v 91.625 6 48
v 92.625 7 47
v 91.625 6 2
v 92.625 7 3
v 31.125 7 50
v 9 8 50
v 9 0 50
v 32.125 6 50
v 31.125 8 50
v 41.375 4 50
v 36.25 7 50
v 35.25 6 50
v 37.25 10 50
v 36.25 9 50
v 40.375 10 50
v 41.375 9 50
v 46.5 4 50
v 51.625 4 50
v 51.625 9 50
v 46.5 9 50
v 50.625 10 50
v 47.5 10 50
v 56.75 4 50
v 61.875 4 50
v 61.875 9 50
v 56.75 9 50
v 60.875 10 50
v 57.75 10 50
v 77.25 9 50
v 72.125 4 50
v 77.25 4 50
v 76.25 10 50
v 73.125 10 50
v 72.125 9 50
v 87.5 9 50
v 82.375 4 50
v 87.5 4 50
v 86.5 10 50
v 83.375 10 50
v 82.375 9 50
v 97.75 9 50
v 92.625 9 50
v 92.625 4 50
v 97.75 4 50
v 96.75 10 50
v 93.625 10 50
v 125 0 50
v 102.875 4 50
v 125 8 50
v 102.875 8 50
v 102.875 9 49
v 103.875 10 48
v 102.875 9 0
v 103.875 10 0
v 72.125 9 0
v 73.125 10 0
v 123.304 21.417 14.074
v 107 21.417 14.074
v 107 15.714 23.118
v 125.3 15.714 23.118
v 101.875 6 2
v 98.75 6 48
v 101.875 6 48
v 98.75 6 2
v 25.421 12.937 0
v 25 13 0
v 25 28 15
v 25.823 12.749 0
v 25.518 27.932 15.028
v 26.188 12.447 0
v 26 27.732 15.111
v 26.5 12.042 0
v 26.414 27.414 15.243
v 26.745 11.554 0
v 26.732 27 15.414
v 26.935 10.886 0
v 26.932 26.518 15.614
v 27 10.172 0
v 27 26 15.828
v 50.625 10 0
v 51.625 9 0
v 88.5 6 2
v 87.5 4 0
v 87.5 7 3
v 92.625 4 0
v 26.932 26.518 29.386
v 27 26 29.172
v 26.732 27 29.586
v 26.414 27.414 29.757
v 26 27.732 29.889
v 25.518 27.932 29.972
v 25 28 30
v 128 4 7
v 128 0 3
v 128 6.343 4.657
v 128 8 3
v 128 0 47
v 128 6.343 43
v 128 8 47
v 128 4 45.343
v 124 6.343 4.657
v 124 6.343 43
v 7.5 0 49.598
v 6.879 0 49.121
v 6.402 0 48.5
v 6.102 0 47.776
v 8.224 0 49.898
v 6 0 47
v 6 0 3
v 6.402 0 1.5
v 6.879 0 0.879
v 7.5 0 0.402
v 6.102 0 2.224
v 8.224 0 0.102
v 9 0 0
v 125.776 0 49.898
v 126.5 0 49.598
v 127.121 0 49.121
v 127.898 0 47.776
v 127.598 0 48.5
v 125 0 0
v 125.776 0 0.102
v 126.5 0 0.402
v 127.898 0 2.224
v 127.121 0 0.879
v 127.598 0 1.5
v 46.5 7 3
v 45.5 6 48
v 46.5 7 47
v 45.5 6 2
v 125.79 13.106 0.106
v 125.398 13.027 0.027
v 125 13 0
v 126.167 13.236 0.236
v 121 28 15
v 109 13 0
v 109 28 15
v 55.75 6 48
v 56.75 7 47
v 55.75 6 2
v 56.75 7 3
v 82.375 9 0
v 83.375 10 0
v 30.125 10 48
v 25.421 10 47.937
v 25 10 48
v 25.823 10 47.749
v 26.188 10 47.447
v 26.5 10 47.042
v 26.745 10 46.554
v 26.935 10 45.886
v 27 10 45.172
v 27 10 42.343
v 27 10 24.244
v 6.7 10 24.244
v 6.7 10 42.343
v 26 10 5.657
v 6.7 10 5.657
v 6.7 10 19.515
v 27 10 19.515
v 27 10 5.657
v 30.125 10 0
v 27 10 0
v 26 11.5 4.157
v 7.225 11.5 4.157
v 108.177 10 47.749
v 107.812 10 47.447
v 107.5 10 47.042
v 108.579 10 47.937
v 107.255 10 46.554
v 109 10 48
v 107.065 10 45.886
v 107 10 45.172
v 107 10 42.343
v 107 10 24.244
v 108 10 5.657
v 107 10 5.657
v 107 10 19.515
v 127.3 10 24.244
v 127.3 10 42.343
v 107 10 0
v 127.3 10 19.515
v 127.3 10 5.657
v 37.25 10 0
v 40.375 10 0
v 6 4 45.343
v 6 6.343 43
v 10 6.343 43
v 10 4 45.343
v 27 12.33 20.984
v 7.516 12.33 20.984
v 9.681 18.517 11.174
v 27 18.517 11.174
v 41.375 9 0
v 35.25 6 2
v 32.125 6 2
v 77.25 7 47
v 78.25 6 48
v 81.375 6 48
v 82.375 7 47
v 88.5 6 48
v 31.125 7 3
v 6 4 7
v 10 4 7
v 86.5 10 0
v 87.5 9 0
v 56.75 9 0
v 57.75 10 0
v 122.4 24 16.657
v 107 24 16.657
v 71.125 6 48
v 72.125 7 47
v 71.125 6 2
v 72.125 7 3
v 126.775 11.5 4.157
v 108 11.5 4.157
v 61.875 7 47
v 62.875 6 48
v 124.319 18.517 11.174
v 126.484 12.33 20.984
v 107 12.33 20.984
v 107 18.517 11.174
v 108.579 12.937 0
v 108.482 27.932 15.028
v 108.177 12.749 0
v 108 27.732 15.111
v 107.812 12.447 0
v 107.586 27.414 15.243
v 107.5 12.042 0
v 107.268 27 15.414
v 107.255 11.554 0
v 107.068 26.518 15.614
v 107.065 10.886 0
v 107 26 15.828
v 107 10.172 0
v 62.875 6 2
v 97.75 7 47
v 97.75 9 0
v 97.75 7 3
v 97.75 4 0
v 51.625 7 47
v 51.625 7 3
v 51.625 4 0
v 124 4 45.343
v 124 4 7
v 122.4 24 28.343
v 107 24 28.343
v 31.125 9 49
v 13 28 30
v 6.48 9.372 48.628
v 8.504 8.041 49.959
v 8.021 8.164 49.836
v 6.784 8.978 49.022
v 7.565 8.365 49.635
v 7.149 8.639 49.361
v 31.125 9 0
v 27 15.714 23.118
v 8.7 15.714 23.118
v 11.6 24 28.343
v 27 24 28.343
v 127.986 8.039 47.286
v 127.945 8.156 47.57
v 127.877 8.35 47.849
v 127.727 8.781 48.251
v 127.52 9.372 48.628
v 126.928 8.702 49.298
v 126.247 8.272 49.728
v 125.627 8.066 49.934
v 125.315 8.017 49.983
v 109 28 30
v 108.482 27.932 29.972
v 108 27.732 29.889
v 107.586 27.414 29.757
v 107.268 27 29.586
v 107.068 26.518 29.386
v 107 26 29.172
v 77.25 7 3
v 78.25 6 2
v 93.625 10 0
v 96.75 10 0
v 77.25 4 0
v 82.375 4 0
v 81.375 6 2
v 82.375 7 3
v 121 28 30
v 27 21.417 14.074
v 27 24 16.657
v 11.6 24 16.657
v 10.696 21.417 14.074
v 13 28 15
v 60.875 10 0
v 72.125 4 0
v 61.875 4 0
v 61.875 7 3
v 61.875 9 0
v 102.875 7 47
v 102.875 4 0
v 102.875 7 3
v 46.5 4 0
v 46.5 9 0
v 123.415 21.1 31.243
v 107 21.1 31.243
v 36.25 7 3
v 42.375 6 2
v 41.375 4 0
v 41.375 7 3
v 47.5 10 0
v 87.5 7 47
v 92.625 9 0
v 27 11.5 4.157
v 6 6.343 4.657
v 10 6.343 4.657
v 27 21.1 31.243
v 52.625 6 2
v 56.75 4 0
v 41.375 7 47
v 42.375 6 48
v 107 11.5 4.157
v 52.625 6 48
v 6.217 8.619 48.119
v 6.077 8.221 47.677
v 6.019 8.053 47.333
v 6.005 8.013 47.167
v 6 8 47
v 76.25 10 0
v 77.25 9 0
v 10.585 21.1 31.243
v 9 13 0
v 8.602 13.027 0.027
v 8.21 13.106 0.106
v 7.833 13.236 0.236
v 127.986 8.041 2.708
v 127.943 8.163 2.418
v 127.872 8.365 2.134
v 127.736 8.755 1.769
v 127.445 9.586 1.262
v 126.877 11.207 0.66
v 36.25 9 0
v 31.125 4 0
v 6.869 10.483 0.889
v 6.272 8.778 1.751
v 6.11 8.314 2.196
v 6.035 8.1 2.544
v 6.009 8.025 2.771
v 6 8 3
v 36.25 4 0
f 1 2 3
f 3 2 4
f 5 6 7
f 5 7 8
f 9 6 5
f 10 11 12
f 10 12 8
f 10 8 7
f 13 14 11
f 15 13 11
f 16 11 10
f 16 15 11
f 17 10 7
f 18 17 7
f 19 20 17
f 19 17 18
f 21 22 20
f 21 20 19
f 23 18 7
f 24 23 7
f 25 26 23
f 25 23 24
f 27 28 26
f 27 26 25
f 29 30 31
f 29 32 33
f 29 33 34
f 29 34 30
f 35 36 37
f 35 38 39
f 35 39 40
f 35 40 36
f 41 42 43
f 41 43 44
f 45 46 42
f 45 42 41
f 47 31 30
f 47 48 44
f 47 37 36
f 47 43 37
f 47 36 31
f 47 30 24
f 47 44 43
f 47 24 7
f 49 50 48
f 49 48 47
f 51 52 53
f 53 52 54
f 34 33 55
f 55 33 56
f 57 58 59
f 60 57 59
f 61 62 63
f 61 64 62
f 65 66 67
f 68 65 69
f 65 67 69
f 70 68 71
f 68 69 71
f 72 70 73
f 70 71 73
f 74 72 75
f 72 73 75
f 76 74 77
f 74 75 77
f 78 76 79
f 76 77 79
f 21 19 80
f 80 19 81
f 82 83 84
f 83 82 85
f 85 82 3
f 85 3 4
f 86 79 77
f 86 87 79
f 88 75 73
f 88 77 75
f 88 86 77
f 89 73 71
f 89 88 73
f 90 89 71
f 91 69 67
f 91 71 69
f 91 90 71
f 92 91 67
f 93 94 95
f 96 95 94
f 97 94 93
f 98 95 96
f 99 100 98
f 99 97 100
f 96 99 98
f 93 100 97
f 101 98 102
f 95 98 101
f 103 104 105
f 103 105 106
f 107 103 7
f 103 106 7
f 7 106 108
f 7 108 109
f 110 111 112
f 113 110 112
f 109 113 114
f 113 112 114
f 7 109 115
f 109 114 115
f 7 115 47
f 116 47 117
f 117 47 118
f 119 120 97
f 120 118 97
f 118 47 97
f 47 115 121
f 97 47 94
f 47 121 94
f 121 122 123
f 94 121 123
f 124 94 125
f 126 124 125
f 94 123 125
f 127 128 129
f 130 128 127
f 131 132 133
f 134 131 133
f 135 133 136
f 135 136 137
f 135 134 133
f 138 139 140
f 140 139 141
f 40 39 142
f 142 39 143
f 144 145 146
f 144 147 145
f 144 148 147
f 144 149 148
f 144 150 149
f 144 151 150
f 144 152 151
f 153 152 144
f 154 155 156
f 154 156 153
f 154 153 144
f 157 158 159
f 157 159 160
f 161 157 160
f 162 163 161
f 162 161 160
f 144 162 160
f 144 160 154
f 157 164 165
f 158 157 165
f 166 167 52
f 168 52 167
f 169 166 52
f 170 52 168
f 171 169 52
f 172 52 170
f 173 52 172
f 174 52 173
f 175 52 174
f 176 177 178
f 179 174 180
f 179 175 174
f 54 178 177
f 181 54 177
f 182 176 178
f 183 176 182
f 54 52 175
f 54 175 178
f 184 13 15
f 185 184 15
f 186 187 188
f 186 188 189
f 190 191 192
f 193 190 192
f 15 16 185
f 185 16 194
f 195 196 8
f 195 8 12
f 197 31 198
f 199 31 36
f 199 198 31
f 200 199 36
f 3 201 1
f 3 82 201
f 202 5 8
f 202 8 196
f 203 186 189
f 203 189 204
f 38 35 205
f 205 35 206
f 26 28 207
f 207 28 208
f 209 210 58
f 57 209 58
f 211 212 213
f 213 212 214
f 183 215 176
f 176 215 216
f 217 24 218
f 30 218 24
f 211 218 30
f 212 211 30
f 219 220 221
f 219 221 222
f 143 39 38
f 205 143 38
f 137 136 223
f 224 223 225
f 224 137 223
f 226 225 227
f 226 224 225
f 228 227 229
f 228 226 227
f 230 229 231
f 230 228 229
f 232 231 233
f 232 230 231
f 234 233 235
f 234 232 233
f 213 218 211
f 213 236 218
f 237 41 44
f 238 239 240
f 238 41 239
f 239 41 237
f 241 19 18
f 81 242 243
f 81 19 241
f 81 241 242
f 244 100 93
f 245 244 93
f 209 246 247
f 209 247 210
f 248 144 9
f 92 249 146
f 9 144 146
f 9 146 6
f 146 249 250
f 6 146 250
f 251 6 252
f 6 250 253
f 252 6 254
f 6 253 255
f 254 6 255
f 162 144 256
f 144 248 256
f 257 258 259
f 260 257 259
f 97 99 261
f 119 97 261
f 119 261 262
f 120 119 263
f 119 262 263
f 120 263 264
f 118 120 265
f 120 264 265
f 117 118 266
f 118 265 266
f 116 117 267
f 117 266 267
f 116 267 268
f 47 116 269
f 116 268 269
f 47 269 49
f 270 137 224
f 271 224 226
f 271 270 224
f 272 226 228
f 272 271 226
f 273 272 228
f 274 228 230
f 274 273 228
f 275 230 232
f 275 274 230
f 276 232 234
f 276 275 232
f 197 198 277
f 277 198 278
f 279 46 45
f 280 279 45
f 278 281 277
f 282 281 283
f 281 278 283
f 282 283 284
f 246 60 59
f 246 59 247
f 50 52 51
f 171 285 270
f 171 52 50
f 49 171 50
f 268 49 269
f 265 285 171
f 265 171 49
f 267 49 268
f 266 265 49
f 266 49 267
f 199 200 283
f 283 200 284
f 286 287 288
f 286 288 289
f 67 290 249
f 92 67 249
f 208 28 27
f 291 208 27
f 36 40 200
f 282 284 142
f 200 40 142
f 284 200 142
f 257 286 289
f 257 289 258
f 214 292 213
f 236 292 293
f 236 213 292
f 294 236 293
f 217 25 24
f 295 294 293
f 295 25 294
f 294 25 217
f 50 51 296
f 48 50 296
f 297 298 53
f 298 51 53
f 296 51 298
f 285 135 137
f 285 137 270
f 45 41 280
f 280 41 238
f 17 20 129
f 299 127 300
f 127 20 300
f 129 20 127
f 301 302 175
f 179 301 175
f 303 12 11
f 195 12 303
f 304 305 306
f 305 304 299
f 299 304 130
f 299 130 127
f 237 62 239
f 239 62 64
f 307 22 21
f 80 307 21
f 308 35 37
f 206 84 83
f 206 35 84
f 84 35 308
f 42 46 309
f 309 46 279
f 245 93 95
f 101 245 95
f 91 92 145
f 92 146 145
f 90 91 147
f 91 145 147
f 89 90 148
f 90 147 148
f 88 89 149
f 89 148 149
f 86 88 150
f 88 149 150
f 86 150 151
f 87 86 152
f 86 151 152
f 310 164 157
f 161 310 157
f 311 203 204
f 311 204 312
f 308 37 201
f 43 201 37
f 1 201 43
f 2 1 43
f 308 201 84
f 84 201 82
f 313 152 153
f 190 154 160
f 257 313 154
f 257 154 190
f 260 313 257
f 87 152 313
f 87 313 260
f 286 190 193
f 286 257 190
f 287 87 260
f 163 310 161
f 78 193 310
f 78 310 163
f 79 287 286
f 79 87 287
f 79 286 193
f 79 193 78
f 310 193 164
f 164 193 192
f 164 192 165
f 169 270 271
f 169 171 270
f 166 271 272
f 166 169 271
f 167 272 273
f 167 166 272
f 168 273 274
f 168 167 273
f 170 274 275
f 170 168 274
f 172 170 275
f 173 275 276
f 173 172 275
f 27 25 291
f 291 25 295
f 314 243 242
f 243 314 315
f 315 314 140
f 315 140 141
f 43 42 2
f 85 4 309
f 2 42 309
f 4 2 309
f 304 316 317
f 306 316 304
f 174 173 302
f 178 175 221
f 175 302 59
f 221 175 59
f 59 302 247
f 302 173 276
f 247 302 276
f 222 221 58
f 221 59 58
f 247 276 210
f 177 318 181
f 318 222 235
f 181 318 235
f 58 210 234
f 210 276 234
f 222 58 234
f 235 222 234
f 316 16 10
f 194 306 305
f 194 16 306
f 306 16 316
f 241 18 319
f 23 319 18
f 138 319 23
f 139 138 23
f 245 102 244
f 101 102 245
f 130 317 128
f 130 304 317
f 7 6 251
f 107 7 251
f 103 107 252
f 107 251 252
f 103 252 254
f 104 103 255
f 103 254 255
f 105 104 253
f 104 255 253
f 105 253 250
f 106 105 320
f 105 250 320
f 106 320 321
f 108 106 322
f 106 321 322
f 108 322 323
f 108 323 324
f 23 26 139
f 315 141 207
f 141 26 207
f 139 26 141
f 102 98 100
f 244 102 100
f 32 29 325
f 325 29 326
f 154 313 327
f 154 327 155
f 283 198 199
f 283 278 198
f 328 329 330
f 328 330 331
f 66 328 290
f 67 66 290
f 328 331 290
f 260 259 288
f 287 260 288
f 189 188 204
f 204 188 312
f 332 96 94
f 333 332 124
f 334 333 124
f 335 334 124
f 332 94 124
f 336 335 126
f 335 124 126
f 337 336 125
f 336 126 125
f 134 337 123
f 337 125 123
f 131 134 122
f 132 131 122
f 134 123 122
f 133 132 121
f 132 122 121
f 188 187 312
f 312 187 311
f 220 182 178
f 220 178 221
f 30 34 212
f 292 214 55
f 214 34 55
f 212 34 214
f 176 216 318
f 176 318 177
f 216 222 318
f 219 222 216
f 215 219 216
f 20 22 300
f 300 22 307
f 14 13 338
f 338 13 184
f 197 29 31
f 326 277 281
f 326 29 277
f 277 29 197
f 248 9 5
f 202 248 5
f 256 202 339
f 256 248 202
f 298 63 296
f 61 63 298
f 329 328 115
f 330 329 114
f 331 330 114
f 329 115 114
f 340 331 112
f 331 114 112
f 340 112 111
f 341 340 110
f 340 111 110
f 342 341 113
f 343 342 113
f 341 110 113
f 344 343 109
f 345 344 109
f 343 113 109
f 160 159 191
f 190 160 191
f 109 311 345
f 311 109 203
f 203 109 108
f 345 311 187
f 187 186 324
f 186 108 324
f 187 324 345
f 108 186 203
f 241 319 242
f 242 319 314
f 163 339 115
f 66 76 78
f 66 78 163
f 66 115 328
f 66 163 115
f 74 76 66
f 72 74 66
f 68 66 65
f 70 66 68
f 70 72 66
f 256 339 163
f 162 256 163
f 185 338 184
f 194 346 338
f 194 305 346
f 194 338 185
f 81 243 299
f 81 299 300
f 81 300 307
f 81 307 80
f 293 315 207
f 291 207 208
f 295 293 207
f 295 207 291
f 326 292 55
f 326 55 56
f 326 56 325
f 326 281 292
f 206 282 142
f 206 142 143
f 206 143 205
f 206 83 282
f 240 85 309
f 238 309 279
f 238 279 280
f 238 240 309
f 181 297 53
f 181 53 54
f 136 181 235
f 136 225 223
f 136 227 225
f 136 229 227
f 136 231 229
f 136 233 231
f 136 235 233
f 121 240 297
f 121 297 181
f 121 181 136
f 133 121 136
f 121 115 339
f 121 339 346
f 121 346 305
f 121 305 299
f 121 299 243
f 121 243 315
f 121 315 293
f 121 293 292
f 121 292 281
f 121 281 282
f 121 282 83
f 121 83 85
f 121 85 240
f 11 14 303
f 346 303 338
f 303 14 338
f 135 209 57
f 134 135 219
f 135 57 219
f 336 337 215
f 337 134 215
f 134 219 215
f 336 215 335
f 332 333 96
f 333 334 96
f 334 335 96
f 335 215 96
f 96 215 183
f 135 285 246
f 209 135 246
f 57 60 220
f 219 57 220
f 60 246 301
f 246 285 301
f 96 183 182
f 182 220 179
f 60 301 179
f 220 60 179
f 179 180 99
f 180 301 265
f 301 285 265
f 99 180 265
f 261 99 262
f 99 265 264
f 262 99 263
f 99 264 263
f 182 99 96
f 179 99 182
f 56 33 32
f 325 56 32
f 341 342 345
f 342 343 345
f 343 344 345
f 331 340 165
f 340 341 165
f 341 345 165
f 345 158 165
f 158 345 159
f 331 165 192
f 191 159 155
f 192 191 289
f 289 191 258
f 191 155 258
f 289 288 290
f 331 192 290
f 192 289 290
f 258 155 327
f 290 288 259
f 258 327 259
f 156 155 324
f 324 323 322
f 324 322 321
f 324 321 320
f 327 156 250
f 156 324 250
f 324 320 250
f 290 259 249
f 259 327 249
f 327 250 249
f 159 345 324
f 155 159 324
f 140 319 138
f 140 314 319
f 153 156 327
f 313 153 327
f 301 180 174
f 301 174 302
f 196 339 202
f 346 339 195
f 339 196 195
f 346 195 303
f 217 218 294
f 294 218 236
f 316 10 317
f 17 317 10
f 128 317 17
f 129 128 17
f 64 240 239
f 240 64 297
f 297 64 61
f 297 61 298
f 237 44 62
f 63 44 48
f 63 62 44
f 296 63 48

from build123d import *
from OCP.BRepFilletAPI import BRepFilletAPI_MakeChamfer

# Parameters (mm, degrees)
SKETCH1_W                 = 26
SKETCH1_H                 = 18
SKETCH1_W_2               = 134
SKETCH1_H_2               = 10
BOSS_EXTRUDE1_DEPTH       = 50
SKETCH4_W                 = 5.125
SKETCH4_H                 = 50
CUT_EXTRUDE3_DEPTH        = 4
CHAMFER1_SIZE             = 2
CHAMFER2_SIZE             = 1
CHAMFER3_SIZE             = 1
CHAMFER4_SIZE             = 1
CHAMFER5_SIZE             = 15
CHAMFER6_SIZE             = 20
CUT_EXTRUDE4_DEPTH        = 159
CHAMFER9_SIZE             = 3
CHAMFER9_SIZE2            = 2.121320344
SKETCH6_W                 = 42
SKETCH6_H                 = 2.343145751
CUT_EXTRUDE5_DEPTH        = 10
CHAMFER10_SIZE            = 3
CHAMFER10_OF_MIRROR1_SIZE = 3
CUT_EXTRUDE6_DEPTH        = 94
FILLET2_R                 = 2
BOSS_EXTRUDE2_DEPTH       = 1
SKETCH9_W                 = 4
SKETCH9_H                 = 8
CUT_EXTRUDE7_DEPTH        = 84
FILLET3_R                 = 3
FILLET4_R                 = 2


with BuildPart() as part:
    # Sketch1 → Boss-Extrude1 (new body)
    with BuildSketch(Plane.XY):
        with Locations((13, 19)):
            Rectangle(SKETCH1_W, SKETCH1_H)
        with Locations((67, 5)):
            Rectangle(SKETCH1_W_2, SKETCH1_H_2)
        with Locations((121, 19)):
            Rectangle(SKETCH1_W, SKETCH1_H)
    extrude(amount=BOSS_EXTRUDE1_DEPTH)

    # Sketch4 → Cut-Extrude3 (cut)
    with BuildSketch(Plane(origin=(0, 10, 0), x_dir=(1, 0, 0), z_dir=(0, 1, 0))):
        with Locations((33.6875, -25)):
            Rectangle(SKETCH4_W, SKETCH4_H)
        with Locations((100.3125, -25)):
            Rectangle(SKETCH4_W, SKETCH4_H)
        with Locations((43.9375, -25)):
            Rectangle(SKETCH4_W, SKETCH4_H)
        with Locations((90.0625, -25)):
            Rectangle(SKETCH4_W, SKETCH4_H)
        with Locations((54.1875, -25)):
            Rectangle(SKETCH4_W, SKETCH4_H)
        with Locations((79.8125, -25)):
            Rectangle(SKETCH4_W, SKETCH4_H)
        with Locations((64.4375, -25)):
            Rectangle(SKETCH4_W, SKETCH4_H)
        with Locations((69.5625, -25)):
            Rectangle(SKETCH4_W, SKETCH4_H)
    extrude(amount=-CUT_EXTRUDE3_DEPTH, mode=Mode.SUBTRACT)

    # Chamfer1
    chamfer1_edges = [part.edges().sort_by_distance(p)[0] for p in [
        (100.3125, 6, 50),
        (100.3125, 6, 0),
        (43.9375, 6, 0),
        (43.9375, 6, 50),
        (90.0625, 6, 50),
        (90.0625, 6, 0),
        (54.1875, 6, 0),
        (54.1875, 6, 50),
        (33.6875, 6, 0),
        (67, 6, 0),
        (67, 6, 50),
        (79.8125, 6, 50),
        (79.8125, 6, 0),
    ]]
    chamfer(chamfer1_edges, length=CHAMFER1_SIZE)

    # Chamfer2
    chamfer2_edges = [part.edges().sort_by_distance(p)[0] for p in [
        (102.875, 10, 25),
        (97.75, 10, 25),
        (41.375, 10, 25),
        (46.5, 10, 25),
        (92.625, 10, 25),
        (87.5, 10, 25),
        (51.625, 10, 25),
        (56.75, 10, 25),
        (31.125, 10, 25),
        (36.25, 10, 25),
        (61.875, 10, 25),
        (72.125, 10, 25),
        (82.375, 10, 25),
        (77.25, 10, 25),
    ]]
    chamfer(chamfer2_edges, length=CHAMFER2_SIZE)

    # Chamfer3
    chamfer3_edges = [part.edges().sort_by_distance(p)[0] for p in [
        (102.875, 6, 25),
        (97.75, 6, 25),
    ]]
    chamfer(chamfer3_edges, length=CHAMFER3_SIZE)

    # Chamfer4
    chamfer4_edges = [part.edges().sort_by_distance(p)[0] for p in [
        (41.375, 6, 25),
        (46.5, 6, 25),
        (51.625, 6, 25),
        (56.75, 6, 25),
        (61.875, 6, 25),
        (72.125, 6, 25),
        (82.375, 6, 25),
        (77.25, 6, 25),
        (92.625, 6, 25),
        (87.5, 6, 25),
        (36.25, 6, 26),
        (31.125, 6, 26),
    ]]
    chamfer(chamfer4_edges, length=CHAMFER4_SIZE)

    # Chamfer5
    chamfer5_edges = [part.edges().sort_by_distance(p)[0] for p in [
        (121, 28, 0),
        (13, 28, 0),
    ]]
    chamfer(chamfer5_edges, length=CHAMFER5_SIZE)

    # Chamfer6
    chamfer6_edges = [part.edges().sort_by_distance(p)[0] for p in [
        (13, 28, 50),
        (121, 28, 50),
    ]]
    chamfer(chamfer6_edges, length=CHAMFER6_SIZE)

    # Sketch5 → Cut-Extrude4 (cut)
    with BuildSketch(Plane(origin=(134, 0, 0), x_dir=(0, 0, -1), z_dir=(1, 0, 0))):
        Polygon((-23.118005616, 15.713850942), (-14.073840564, 21.416986315), (-16.656854249, 24), (-28.343145751, 24), align=None)
        Polygon((-24.243797472, 10), (-31.243250282, 21.099895469), (-38.343145751, 14), (-42.343145751, 10), align=None)
        Polygon((-20.98443273, 12.330381312), (-19.514923935, 10), (-2.656854249, 10), (-6.656854249, 14), (-11.173736033, 18.516881784), align=None)
    extrude(amount=-CUT_EXTRUDE4_DEPTH, mode=Mode.SUBTRACT)

    # Chamfer9: one chamfer whose edges measure the first distance from different faces: ONE call of the kernel's chamfer builder (chamfer() names one face for all edges)
    chamfer9_edges_1 = [part.edges().sort_by_distance(p)[0] for p in [
        (13, 10, 2.656854249),
    ]]
    chamfer9_side_1 = [part.faces().sort_by_distance(p)[0] for p in [
        (28.0625, 10, 0.566702358),
    ]]
    chamfer9_edges_2 = [part.edges().sort_by_distance(p)[0] for p in [
        (121, 10, 2.656854249),
    ]]
    chamfer9_side_2 = [part.faces().sort_by_distance(p)[0] for p in [
        (104.441702358, 10, 24),
    ]]
    chamfer9 = BRepFilletAPI_MakeChamfer(part.part.solid().wrapped)
    for e in chamfer9_edges_1:
        chamfer9.Add(CHAMFER9_SIZE, CHAMFER9_SIZE2, e.wrapped, chamfer9_side_1[0].wrapped)  # the first distance lies on this face
    for e in chamfer9_edges_2:
        chamfer9.Add(CHAMFER9_SIZE, CHAMFER9_SIZE2, e.wrapped, chamfer9_side_2[0].wrapped)  # the first distance lies on this face
    add(Compound.cast(chamfer9.Shape()), mode=Mode.REPLACE)

    # Sketch6 → Cut-Extrude5 (cut)
    with BuildSketch(Plane(origin=(134, 0, 0), x_dir=(0, 0, -1), z_dir=(1, 0, 0))):
        with Locations((-25, 5.171572876)):
            Rectangle(SKETCH6_W, SKETCH6_H)
    cut_extrude5 = extrude(amount=-CUT_EXTRUDE5_DEPTH, mode=Mode.SUBTRACT)

    # Chamfer10
    # the kernel refuses this chamfer: 3 mm, written as the material it adds along each edge
    with BuildSketch(Plane(origin=(134, 4, 4), x_dir=(0, -0.02749587661058634, 0.9996219169112968), z_dir=(-1, 0, 0)), Plane(origin=(134, 6.343145751, 46), x_dir=(0, 0.02749587661058648, -0.9996219169112968), z_dir=(-1, 0, 0))) as chamfer10_piece_1:
        Polygon((CHAMFER10_SIZE * 0.999621916911, CHAMFER10_SIZE * 0.0274958766106), (-CHAMFER10_SIZE * 0.0274958766106, CHAMFER10_SIZE * 0.999621916911), (0, 0), align=None)
    extrude(amount=17.715048964)

    # Mirror1: Cut-Extrude5 across plane
    add(cut_extrude5.mirror(Plane.ZY.offset(-67)), mode=Mode.SUBTRACT)

    # Chamfer10 of Mirror1
    # the kernel refuses this chamfer: 3 mm, written as the material it adds along each edge
    with BuildSketch(Plane(origin=(0, 4, 4), x_dir=(0, -0.02749587661058634, 0.9996219169112968), z_dir=(1, 0, 0)), Plane(origin=(0, 6.343145751, 46), x_dir=(0, 0.02749587661058648, -0.9996219169112968), z_dir=(1, 0, 0))) as chamfer10_of_mirror1_piece_1:
        Polygon((CHAMFER10_OF_MIRROR1_SIZE * 0.999621916911, -CHAMFER10_OF_MIRROR1_SIZE * 0.0274958766106), (-CHAMFER10_OF_MIRROR1_SIZE * 0.0274958766106, -CHAMFER10_OF_MIRROR1_SIZE * 0.999621916911), (0, 0), align=None)
    extrude(amount=17.715048964)

    # Sketch7 → Cut-Extrude6 (cut)
    with BuildSketch(Plane.XY.offset(50)):
        Polygon((0, 8), (13, 28), (0, 28), align=None)
        Polygon((121, 28), (134, 8), (134, 28), align=None)
    extrude(amount=-CUT_EXTRUDE6_DEPTH, mode=Mode.SUBTRACT)

    # Fillet2
    fillet2_edges = [part.edges().sort_by_distance(p)[0] for p in [
        (0, 4, 0),
        (134, 4, 0),
        (0, 4, 50),
        (134, 4, 50),
    ]]
    fillet(fillet2_edges, radius=FILLET2_R)

    # Sketch8 → Boss-Extrude2 (add)
    with BuildSketch(Plane(origin=(26, 0, 0), x_dir=(0, 0, -1), z_dir=(1, 0, 0))):
        Polygon((-11.173736033, 18.516881784), (-4.156854249, 11.5), (-5.656854249, 10), (0, 10), (0, 13), (-15, 28), (-30, 28), (-48, 10), (-42.343145751, 10), (-31.243250282, 21.099895469), (-24.243797472, 10), (-19.514923935, 10), (-20.98443273, 12.330381312), align=None)
        Polygon((-16.656854249, 24), (-14.073840564, 21.416986315), (-23.118005616, 15.713850942), (-28.343145751, 24), align=None, mode=Mode.SUBTRACT)
    boss_extrude2 = extrude(amount=BOSS_EXTRUDE2_DEPTH)

    # Mirror2: Boss-Extrude2 across plane
    add(boss_extrude2.mirror(Plane(origin=(67, 0, 0), x_dir=(0, 0, 1), z_dir=(1, 0, 0))))

    # Sketch9 → Cut-Extrude7 (cut)
    with BuildSketch(Plane.XY.offset(50)):
        with Locations((4, 4)):
            Rectangle(SKETCH9_W, SKETCH9_H)
        Polygon((0, 8), (0, 0), (2, 0), (2, 8), (6, 8), (6, 17.230769231), align=None)
        Polygon((13, 28), (6, 17.230769231), (6, 8), align=None)
        Polygon((121, 28), (128, 8), (128, 17.230769231), align=None)
        Polygon((132, 8), (132, 0), (134, 0), (134, 8), (128, 17.230769231), (128, 8), align=None)
        with Locations((130, 4)):
            Rectangle(SKETCH9_W, SKETCH9_H)
    extrude(amount=-CUT_EXTRUDE7_DEPTH, mode=Mode.SUBTRACT)

    # Fillet3
    fillet3_edges = [part.edges().sort_by_distance(p)[0] for p in [
        (128, 4, 0),
        (128, 4, 50),
        (6, 4, 50),
        (6, 4, 0),
    ]]
    fillet(fillet3_edges, radius=FILLET3_R)

    # Fillet4
    fillet4_edges = [part.edges().sort_by_distance(p)[0] for p in [
        (27, 20.5, 7.5),
        (27, 28, 22.5),
        (27, 19, 39),
        (107, 19, 39),
        (107, 28, 22.5),
        (107, 20.5, 7.5),
    ]]
    fillet(fillet4_edges, radius=FILLET4_R)


solid = part.part
